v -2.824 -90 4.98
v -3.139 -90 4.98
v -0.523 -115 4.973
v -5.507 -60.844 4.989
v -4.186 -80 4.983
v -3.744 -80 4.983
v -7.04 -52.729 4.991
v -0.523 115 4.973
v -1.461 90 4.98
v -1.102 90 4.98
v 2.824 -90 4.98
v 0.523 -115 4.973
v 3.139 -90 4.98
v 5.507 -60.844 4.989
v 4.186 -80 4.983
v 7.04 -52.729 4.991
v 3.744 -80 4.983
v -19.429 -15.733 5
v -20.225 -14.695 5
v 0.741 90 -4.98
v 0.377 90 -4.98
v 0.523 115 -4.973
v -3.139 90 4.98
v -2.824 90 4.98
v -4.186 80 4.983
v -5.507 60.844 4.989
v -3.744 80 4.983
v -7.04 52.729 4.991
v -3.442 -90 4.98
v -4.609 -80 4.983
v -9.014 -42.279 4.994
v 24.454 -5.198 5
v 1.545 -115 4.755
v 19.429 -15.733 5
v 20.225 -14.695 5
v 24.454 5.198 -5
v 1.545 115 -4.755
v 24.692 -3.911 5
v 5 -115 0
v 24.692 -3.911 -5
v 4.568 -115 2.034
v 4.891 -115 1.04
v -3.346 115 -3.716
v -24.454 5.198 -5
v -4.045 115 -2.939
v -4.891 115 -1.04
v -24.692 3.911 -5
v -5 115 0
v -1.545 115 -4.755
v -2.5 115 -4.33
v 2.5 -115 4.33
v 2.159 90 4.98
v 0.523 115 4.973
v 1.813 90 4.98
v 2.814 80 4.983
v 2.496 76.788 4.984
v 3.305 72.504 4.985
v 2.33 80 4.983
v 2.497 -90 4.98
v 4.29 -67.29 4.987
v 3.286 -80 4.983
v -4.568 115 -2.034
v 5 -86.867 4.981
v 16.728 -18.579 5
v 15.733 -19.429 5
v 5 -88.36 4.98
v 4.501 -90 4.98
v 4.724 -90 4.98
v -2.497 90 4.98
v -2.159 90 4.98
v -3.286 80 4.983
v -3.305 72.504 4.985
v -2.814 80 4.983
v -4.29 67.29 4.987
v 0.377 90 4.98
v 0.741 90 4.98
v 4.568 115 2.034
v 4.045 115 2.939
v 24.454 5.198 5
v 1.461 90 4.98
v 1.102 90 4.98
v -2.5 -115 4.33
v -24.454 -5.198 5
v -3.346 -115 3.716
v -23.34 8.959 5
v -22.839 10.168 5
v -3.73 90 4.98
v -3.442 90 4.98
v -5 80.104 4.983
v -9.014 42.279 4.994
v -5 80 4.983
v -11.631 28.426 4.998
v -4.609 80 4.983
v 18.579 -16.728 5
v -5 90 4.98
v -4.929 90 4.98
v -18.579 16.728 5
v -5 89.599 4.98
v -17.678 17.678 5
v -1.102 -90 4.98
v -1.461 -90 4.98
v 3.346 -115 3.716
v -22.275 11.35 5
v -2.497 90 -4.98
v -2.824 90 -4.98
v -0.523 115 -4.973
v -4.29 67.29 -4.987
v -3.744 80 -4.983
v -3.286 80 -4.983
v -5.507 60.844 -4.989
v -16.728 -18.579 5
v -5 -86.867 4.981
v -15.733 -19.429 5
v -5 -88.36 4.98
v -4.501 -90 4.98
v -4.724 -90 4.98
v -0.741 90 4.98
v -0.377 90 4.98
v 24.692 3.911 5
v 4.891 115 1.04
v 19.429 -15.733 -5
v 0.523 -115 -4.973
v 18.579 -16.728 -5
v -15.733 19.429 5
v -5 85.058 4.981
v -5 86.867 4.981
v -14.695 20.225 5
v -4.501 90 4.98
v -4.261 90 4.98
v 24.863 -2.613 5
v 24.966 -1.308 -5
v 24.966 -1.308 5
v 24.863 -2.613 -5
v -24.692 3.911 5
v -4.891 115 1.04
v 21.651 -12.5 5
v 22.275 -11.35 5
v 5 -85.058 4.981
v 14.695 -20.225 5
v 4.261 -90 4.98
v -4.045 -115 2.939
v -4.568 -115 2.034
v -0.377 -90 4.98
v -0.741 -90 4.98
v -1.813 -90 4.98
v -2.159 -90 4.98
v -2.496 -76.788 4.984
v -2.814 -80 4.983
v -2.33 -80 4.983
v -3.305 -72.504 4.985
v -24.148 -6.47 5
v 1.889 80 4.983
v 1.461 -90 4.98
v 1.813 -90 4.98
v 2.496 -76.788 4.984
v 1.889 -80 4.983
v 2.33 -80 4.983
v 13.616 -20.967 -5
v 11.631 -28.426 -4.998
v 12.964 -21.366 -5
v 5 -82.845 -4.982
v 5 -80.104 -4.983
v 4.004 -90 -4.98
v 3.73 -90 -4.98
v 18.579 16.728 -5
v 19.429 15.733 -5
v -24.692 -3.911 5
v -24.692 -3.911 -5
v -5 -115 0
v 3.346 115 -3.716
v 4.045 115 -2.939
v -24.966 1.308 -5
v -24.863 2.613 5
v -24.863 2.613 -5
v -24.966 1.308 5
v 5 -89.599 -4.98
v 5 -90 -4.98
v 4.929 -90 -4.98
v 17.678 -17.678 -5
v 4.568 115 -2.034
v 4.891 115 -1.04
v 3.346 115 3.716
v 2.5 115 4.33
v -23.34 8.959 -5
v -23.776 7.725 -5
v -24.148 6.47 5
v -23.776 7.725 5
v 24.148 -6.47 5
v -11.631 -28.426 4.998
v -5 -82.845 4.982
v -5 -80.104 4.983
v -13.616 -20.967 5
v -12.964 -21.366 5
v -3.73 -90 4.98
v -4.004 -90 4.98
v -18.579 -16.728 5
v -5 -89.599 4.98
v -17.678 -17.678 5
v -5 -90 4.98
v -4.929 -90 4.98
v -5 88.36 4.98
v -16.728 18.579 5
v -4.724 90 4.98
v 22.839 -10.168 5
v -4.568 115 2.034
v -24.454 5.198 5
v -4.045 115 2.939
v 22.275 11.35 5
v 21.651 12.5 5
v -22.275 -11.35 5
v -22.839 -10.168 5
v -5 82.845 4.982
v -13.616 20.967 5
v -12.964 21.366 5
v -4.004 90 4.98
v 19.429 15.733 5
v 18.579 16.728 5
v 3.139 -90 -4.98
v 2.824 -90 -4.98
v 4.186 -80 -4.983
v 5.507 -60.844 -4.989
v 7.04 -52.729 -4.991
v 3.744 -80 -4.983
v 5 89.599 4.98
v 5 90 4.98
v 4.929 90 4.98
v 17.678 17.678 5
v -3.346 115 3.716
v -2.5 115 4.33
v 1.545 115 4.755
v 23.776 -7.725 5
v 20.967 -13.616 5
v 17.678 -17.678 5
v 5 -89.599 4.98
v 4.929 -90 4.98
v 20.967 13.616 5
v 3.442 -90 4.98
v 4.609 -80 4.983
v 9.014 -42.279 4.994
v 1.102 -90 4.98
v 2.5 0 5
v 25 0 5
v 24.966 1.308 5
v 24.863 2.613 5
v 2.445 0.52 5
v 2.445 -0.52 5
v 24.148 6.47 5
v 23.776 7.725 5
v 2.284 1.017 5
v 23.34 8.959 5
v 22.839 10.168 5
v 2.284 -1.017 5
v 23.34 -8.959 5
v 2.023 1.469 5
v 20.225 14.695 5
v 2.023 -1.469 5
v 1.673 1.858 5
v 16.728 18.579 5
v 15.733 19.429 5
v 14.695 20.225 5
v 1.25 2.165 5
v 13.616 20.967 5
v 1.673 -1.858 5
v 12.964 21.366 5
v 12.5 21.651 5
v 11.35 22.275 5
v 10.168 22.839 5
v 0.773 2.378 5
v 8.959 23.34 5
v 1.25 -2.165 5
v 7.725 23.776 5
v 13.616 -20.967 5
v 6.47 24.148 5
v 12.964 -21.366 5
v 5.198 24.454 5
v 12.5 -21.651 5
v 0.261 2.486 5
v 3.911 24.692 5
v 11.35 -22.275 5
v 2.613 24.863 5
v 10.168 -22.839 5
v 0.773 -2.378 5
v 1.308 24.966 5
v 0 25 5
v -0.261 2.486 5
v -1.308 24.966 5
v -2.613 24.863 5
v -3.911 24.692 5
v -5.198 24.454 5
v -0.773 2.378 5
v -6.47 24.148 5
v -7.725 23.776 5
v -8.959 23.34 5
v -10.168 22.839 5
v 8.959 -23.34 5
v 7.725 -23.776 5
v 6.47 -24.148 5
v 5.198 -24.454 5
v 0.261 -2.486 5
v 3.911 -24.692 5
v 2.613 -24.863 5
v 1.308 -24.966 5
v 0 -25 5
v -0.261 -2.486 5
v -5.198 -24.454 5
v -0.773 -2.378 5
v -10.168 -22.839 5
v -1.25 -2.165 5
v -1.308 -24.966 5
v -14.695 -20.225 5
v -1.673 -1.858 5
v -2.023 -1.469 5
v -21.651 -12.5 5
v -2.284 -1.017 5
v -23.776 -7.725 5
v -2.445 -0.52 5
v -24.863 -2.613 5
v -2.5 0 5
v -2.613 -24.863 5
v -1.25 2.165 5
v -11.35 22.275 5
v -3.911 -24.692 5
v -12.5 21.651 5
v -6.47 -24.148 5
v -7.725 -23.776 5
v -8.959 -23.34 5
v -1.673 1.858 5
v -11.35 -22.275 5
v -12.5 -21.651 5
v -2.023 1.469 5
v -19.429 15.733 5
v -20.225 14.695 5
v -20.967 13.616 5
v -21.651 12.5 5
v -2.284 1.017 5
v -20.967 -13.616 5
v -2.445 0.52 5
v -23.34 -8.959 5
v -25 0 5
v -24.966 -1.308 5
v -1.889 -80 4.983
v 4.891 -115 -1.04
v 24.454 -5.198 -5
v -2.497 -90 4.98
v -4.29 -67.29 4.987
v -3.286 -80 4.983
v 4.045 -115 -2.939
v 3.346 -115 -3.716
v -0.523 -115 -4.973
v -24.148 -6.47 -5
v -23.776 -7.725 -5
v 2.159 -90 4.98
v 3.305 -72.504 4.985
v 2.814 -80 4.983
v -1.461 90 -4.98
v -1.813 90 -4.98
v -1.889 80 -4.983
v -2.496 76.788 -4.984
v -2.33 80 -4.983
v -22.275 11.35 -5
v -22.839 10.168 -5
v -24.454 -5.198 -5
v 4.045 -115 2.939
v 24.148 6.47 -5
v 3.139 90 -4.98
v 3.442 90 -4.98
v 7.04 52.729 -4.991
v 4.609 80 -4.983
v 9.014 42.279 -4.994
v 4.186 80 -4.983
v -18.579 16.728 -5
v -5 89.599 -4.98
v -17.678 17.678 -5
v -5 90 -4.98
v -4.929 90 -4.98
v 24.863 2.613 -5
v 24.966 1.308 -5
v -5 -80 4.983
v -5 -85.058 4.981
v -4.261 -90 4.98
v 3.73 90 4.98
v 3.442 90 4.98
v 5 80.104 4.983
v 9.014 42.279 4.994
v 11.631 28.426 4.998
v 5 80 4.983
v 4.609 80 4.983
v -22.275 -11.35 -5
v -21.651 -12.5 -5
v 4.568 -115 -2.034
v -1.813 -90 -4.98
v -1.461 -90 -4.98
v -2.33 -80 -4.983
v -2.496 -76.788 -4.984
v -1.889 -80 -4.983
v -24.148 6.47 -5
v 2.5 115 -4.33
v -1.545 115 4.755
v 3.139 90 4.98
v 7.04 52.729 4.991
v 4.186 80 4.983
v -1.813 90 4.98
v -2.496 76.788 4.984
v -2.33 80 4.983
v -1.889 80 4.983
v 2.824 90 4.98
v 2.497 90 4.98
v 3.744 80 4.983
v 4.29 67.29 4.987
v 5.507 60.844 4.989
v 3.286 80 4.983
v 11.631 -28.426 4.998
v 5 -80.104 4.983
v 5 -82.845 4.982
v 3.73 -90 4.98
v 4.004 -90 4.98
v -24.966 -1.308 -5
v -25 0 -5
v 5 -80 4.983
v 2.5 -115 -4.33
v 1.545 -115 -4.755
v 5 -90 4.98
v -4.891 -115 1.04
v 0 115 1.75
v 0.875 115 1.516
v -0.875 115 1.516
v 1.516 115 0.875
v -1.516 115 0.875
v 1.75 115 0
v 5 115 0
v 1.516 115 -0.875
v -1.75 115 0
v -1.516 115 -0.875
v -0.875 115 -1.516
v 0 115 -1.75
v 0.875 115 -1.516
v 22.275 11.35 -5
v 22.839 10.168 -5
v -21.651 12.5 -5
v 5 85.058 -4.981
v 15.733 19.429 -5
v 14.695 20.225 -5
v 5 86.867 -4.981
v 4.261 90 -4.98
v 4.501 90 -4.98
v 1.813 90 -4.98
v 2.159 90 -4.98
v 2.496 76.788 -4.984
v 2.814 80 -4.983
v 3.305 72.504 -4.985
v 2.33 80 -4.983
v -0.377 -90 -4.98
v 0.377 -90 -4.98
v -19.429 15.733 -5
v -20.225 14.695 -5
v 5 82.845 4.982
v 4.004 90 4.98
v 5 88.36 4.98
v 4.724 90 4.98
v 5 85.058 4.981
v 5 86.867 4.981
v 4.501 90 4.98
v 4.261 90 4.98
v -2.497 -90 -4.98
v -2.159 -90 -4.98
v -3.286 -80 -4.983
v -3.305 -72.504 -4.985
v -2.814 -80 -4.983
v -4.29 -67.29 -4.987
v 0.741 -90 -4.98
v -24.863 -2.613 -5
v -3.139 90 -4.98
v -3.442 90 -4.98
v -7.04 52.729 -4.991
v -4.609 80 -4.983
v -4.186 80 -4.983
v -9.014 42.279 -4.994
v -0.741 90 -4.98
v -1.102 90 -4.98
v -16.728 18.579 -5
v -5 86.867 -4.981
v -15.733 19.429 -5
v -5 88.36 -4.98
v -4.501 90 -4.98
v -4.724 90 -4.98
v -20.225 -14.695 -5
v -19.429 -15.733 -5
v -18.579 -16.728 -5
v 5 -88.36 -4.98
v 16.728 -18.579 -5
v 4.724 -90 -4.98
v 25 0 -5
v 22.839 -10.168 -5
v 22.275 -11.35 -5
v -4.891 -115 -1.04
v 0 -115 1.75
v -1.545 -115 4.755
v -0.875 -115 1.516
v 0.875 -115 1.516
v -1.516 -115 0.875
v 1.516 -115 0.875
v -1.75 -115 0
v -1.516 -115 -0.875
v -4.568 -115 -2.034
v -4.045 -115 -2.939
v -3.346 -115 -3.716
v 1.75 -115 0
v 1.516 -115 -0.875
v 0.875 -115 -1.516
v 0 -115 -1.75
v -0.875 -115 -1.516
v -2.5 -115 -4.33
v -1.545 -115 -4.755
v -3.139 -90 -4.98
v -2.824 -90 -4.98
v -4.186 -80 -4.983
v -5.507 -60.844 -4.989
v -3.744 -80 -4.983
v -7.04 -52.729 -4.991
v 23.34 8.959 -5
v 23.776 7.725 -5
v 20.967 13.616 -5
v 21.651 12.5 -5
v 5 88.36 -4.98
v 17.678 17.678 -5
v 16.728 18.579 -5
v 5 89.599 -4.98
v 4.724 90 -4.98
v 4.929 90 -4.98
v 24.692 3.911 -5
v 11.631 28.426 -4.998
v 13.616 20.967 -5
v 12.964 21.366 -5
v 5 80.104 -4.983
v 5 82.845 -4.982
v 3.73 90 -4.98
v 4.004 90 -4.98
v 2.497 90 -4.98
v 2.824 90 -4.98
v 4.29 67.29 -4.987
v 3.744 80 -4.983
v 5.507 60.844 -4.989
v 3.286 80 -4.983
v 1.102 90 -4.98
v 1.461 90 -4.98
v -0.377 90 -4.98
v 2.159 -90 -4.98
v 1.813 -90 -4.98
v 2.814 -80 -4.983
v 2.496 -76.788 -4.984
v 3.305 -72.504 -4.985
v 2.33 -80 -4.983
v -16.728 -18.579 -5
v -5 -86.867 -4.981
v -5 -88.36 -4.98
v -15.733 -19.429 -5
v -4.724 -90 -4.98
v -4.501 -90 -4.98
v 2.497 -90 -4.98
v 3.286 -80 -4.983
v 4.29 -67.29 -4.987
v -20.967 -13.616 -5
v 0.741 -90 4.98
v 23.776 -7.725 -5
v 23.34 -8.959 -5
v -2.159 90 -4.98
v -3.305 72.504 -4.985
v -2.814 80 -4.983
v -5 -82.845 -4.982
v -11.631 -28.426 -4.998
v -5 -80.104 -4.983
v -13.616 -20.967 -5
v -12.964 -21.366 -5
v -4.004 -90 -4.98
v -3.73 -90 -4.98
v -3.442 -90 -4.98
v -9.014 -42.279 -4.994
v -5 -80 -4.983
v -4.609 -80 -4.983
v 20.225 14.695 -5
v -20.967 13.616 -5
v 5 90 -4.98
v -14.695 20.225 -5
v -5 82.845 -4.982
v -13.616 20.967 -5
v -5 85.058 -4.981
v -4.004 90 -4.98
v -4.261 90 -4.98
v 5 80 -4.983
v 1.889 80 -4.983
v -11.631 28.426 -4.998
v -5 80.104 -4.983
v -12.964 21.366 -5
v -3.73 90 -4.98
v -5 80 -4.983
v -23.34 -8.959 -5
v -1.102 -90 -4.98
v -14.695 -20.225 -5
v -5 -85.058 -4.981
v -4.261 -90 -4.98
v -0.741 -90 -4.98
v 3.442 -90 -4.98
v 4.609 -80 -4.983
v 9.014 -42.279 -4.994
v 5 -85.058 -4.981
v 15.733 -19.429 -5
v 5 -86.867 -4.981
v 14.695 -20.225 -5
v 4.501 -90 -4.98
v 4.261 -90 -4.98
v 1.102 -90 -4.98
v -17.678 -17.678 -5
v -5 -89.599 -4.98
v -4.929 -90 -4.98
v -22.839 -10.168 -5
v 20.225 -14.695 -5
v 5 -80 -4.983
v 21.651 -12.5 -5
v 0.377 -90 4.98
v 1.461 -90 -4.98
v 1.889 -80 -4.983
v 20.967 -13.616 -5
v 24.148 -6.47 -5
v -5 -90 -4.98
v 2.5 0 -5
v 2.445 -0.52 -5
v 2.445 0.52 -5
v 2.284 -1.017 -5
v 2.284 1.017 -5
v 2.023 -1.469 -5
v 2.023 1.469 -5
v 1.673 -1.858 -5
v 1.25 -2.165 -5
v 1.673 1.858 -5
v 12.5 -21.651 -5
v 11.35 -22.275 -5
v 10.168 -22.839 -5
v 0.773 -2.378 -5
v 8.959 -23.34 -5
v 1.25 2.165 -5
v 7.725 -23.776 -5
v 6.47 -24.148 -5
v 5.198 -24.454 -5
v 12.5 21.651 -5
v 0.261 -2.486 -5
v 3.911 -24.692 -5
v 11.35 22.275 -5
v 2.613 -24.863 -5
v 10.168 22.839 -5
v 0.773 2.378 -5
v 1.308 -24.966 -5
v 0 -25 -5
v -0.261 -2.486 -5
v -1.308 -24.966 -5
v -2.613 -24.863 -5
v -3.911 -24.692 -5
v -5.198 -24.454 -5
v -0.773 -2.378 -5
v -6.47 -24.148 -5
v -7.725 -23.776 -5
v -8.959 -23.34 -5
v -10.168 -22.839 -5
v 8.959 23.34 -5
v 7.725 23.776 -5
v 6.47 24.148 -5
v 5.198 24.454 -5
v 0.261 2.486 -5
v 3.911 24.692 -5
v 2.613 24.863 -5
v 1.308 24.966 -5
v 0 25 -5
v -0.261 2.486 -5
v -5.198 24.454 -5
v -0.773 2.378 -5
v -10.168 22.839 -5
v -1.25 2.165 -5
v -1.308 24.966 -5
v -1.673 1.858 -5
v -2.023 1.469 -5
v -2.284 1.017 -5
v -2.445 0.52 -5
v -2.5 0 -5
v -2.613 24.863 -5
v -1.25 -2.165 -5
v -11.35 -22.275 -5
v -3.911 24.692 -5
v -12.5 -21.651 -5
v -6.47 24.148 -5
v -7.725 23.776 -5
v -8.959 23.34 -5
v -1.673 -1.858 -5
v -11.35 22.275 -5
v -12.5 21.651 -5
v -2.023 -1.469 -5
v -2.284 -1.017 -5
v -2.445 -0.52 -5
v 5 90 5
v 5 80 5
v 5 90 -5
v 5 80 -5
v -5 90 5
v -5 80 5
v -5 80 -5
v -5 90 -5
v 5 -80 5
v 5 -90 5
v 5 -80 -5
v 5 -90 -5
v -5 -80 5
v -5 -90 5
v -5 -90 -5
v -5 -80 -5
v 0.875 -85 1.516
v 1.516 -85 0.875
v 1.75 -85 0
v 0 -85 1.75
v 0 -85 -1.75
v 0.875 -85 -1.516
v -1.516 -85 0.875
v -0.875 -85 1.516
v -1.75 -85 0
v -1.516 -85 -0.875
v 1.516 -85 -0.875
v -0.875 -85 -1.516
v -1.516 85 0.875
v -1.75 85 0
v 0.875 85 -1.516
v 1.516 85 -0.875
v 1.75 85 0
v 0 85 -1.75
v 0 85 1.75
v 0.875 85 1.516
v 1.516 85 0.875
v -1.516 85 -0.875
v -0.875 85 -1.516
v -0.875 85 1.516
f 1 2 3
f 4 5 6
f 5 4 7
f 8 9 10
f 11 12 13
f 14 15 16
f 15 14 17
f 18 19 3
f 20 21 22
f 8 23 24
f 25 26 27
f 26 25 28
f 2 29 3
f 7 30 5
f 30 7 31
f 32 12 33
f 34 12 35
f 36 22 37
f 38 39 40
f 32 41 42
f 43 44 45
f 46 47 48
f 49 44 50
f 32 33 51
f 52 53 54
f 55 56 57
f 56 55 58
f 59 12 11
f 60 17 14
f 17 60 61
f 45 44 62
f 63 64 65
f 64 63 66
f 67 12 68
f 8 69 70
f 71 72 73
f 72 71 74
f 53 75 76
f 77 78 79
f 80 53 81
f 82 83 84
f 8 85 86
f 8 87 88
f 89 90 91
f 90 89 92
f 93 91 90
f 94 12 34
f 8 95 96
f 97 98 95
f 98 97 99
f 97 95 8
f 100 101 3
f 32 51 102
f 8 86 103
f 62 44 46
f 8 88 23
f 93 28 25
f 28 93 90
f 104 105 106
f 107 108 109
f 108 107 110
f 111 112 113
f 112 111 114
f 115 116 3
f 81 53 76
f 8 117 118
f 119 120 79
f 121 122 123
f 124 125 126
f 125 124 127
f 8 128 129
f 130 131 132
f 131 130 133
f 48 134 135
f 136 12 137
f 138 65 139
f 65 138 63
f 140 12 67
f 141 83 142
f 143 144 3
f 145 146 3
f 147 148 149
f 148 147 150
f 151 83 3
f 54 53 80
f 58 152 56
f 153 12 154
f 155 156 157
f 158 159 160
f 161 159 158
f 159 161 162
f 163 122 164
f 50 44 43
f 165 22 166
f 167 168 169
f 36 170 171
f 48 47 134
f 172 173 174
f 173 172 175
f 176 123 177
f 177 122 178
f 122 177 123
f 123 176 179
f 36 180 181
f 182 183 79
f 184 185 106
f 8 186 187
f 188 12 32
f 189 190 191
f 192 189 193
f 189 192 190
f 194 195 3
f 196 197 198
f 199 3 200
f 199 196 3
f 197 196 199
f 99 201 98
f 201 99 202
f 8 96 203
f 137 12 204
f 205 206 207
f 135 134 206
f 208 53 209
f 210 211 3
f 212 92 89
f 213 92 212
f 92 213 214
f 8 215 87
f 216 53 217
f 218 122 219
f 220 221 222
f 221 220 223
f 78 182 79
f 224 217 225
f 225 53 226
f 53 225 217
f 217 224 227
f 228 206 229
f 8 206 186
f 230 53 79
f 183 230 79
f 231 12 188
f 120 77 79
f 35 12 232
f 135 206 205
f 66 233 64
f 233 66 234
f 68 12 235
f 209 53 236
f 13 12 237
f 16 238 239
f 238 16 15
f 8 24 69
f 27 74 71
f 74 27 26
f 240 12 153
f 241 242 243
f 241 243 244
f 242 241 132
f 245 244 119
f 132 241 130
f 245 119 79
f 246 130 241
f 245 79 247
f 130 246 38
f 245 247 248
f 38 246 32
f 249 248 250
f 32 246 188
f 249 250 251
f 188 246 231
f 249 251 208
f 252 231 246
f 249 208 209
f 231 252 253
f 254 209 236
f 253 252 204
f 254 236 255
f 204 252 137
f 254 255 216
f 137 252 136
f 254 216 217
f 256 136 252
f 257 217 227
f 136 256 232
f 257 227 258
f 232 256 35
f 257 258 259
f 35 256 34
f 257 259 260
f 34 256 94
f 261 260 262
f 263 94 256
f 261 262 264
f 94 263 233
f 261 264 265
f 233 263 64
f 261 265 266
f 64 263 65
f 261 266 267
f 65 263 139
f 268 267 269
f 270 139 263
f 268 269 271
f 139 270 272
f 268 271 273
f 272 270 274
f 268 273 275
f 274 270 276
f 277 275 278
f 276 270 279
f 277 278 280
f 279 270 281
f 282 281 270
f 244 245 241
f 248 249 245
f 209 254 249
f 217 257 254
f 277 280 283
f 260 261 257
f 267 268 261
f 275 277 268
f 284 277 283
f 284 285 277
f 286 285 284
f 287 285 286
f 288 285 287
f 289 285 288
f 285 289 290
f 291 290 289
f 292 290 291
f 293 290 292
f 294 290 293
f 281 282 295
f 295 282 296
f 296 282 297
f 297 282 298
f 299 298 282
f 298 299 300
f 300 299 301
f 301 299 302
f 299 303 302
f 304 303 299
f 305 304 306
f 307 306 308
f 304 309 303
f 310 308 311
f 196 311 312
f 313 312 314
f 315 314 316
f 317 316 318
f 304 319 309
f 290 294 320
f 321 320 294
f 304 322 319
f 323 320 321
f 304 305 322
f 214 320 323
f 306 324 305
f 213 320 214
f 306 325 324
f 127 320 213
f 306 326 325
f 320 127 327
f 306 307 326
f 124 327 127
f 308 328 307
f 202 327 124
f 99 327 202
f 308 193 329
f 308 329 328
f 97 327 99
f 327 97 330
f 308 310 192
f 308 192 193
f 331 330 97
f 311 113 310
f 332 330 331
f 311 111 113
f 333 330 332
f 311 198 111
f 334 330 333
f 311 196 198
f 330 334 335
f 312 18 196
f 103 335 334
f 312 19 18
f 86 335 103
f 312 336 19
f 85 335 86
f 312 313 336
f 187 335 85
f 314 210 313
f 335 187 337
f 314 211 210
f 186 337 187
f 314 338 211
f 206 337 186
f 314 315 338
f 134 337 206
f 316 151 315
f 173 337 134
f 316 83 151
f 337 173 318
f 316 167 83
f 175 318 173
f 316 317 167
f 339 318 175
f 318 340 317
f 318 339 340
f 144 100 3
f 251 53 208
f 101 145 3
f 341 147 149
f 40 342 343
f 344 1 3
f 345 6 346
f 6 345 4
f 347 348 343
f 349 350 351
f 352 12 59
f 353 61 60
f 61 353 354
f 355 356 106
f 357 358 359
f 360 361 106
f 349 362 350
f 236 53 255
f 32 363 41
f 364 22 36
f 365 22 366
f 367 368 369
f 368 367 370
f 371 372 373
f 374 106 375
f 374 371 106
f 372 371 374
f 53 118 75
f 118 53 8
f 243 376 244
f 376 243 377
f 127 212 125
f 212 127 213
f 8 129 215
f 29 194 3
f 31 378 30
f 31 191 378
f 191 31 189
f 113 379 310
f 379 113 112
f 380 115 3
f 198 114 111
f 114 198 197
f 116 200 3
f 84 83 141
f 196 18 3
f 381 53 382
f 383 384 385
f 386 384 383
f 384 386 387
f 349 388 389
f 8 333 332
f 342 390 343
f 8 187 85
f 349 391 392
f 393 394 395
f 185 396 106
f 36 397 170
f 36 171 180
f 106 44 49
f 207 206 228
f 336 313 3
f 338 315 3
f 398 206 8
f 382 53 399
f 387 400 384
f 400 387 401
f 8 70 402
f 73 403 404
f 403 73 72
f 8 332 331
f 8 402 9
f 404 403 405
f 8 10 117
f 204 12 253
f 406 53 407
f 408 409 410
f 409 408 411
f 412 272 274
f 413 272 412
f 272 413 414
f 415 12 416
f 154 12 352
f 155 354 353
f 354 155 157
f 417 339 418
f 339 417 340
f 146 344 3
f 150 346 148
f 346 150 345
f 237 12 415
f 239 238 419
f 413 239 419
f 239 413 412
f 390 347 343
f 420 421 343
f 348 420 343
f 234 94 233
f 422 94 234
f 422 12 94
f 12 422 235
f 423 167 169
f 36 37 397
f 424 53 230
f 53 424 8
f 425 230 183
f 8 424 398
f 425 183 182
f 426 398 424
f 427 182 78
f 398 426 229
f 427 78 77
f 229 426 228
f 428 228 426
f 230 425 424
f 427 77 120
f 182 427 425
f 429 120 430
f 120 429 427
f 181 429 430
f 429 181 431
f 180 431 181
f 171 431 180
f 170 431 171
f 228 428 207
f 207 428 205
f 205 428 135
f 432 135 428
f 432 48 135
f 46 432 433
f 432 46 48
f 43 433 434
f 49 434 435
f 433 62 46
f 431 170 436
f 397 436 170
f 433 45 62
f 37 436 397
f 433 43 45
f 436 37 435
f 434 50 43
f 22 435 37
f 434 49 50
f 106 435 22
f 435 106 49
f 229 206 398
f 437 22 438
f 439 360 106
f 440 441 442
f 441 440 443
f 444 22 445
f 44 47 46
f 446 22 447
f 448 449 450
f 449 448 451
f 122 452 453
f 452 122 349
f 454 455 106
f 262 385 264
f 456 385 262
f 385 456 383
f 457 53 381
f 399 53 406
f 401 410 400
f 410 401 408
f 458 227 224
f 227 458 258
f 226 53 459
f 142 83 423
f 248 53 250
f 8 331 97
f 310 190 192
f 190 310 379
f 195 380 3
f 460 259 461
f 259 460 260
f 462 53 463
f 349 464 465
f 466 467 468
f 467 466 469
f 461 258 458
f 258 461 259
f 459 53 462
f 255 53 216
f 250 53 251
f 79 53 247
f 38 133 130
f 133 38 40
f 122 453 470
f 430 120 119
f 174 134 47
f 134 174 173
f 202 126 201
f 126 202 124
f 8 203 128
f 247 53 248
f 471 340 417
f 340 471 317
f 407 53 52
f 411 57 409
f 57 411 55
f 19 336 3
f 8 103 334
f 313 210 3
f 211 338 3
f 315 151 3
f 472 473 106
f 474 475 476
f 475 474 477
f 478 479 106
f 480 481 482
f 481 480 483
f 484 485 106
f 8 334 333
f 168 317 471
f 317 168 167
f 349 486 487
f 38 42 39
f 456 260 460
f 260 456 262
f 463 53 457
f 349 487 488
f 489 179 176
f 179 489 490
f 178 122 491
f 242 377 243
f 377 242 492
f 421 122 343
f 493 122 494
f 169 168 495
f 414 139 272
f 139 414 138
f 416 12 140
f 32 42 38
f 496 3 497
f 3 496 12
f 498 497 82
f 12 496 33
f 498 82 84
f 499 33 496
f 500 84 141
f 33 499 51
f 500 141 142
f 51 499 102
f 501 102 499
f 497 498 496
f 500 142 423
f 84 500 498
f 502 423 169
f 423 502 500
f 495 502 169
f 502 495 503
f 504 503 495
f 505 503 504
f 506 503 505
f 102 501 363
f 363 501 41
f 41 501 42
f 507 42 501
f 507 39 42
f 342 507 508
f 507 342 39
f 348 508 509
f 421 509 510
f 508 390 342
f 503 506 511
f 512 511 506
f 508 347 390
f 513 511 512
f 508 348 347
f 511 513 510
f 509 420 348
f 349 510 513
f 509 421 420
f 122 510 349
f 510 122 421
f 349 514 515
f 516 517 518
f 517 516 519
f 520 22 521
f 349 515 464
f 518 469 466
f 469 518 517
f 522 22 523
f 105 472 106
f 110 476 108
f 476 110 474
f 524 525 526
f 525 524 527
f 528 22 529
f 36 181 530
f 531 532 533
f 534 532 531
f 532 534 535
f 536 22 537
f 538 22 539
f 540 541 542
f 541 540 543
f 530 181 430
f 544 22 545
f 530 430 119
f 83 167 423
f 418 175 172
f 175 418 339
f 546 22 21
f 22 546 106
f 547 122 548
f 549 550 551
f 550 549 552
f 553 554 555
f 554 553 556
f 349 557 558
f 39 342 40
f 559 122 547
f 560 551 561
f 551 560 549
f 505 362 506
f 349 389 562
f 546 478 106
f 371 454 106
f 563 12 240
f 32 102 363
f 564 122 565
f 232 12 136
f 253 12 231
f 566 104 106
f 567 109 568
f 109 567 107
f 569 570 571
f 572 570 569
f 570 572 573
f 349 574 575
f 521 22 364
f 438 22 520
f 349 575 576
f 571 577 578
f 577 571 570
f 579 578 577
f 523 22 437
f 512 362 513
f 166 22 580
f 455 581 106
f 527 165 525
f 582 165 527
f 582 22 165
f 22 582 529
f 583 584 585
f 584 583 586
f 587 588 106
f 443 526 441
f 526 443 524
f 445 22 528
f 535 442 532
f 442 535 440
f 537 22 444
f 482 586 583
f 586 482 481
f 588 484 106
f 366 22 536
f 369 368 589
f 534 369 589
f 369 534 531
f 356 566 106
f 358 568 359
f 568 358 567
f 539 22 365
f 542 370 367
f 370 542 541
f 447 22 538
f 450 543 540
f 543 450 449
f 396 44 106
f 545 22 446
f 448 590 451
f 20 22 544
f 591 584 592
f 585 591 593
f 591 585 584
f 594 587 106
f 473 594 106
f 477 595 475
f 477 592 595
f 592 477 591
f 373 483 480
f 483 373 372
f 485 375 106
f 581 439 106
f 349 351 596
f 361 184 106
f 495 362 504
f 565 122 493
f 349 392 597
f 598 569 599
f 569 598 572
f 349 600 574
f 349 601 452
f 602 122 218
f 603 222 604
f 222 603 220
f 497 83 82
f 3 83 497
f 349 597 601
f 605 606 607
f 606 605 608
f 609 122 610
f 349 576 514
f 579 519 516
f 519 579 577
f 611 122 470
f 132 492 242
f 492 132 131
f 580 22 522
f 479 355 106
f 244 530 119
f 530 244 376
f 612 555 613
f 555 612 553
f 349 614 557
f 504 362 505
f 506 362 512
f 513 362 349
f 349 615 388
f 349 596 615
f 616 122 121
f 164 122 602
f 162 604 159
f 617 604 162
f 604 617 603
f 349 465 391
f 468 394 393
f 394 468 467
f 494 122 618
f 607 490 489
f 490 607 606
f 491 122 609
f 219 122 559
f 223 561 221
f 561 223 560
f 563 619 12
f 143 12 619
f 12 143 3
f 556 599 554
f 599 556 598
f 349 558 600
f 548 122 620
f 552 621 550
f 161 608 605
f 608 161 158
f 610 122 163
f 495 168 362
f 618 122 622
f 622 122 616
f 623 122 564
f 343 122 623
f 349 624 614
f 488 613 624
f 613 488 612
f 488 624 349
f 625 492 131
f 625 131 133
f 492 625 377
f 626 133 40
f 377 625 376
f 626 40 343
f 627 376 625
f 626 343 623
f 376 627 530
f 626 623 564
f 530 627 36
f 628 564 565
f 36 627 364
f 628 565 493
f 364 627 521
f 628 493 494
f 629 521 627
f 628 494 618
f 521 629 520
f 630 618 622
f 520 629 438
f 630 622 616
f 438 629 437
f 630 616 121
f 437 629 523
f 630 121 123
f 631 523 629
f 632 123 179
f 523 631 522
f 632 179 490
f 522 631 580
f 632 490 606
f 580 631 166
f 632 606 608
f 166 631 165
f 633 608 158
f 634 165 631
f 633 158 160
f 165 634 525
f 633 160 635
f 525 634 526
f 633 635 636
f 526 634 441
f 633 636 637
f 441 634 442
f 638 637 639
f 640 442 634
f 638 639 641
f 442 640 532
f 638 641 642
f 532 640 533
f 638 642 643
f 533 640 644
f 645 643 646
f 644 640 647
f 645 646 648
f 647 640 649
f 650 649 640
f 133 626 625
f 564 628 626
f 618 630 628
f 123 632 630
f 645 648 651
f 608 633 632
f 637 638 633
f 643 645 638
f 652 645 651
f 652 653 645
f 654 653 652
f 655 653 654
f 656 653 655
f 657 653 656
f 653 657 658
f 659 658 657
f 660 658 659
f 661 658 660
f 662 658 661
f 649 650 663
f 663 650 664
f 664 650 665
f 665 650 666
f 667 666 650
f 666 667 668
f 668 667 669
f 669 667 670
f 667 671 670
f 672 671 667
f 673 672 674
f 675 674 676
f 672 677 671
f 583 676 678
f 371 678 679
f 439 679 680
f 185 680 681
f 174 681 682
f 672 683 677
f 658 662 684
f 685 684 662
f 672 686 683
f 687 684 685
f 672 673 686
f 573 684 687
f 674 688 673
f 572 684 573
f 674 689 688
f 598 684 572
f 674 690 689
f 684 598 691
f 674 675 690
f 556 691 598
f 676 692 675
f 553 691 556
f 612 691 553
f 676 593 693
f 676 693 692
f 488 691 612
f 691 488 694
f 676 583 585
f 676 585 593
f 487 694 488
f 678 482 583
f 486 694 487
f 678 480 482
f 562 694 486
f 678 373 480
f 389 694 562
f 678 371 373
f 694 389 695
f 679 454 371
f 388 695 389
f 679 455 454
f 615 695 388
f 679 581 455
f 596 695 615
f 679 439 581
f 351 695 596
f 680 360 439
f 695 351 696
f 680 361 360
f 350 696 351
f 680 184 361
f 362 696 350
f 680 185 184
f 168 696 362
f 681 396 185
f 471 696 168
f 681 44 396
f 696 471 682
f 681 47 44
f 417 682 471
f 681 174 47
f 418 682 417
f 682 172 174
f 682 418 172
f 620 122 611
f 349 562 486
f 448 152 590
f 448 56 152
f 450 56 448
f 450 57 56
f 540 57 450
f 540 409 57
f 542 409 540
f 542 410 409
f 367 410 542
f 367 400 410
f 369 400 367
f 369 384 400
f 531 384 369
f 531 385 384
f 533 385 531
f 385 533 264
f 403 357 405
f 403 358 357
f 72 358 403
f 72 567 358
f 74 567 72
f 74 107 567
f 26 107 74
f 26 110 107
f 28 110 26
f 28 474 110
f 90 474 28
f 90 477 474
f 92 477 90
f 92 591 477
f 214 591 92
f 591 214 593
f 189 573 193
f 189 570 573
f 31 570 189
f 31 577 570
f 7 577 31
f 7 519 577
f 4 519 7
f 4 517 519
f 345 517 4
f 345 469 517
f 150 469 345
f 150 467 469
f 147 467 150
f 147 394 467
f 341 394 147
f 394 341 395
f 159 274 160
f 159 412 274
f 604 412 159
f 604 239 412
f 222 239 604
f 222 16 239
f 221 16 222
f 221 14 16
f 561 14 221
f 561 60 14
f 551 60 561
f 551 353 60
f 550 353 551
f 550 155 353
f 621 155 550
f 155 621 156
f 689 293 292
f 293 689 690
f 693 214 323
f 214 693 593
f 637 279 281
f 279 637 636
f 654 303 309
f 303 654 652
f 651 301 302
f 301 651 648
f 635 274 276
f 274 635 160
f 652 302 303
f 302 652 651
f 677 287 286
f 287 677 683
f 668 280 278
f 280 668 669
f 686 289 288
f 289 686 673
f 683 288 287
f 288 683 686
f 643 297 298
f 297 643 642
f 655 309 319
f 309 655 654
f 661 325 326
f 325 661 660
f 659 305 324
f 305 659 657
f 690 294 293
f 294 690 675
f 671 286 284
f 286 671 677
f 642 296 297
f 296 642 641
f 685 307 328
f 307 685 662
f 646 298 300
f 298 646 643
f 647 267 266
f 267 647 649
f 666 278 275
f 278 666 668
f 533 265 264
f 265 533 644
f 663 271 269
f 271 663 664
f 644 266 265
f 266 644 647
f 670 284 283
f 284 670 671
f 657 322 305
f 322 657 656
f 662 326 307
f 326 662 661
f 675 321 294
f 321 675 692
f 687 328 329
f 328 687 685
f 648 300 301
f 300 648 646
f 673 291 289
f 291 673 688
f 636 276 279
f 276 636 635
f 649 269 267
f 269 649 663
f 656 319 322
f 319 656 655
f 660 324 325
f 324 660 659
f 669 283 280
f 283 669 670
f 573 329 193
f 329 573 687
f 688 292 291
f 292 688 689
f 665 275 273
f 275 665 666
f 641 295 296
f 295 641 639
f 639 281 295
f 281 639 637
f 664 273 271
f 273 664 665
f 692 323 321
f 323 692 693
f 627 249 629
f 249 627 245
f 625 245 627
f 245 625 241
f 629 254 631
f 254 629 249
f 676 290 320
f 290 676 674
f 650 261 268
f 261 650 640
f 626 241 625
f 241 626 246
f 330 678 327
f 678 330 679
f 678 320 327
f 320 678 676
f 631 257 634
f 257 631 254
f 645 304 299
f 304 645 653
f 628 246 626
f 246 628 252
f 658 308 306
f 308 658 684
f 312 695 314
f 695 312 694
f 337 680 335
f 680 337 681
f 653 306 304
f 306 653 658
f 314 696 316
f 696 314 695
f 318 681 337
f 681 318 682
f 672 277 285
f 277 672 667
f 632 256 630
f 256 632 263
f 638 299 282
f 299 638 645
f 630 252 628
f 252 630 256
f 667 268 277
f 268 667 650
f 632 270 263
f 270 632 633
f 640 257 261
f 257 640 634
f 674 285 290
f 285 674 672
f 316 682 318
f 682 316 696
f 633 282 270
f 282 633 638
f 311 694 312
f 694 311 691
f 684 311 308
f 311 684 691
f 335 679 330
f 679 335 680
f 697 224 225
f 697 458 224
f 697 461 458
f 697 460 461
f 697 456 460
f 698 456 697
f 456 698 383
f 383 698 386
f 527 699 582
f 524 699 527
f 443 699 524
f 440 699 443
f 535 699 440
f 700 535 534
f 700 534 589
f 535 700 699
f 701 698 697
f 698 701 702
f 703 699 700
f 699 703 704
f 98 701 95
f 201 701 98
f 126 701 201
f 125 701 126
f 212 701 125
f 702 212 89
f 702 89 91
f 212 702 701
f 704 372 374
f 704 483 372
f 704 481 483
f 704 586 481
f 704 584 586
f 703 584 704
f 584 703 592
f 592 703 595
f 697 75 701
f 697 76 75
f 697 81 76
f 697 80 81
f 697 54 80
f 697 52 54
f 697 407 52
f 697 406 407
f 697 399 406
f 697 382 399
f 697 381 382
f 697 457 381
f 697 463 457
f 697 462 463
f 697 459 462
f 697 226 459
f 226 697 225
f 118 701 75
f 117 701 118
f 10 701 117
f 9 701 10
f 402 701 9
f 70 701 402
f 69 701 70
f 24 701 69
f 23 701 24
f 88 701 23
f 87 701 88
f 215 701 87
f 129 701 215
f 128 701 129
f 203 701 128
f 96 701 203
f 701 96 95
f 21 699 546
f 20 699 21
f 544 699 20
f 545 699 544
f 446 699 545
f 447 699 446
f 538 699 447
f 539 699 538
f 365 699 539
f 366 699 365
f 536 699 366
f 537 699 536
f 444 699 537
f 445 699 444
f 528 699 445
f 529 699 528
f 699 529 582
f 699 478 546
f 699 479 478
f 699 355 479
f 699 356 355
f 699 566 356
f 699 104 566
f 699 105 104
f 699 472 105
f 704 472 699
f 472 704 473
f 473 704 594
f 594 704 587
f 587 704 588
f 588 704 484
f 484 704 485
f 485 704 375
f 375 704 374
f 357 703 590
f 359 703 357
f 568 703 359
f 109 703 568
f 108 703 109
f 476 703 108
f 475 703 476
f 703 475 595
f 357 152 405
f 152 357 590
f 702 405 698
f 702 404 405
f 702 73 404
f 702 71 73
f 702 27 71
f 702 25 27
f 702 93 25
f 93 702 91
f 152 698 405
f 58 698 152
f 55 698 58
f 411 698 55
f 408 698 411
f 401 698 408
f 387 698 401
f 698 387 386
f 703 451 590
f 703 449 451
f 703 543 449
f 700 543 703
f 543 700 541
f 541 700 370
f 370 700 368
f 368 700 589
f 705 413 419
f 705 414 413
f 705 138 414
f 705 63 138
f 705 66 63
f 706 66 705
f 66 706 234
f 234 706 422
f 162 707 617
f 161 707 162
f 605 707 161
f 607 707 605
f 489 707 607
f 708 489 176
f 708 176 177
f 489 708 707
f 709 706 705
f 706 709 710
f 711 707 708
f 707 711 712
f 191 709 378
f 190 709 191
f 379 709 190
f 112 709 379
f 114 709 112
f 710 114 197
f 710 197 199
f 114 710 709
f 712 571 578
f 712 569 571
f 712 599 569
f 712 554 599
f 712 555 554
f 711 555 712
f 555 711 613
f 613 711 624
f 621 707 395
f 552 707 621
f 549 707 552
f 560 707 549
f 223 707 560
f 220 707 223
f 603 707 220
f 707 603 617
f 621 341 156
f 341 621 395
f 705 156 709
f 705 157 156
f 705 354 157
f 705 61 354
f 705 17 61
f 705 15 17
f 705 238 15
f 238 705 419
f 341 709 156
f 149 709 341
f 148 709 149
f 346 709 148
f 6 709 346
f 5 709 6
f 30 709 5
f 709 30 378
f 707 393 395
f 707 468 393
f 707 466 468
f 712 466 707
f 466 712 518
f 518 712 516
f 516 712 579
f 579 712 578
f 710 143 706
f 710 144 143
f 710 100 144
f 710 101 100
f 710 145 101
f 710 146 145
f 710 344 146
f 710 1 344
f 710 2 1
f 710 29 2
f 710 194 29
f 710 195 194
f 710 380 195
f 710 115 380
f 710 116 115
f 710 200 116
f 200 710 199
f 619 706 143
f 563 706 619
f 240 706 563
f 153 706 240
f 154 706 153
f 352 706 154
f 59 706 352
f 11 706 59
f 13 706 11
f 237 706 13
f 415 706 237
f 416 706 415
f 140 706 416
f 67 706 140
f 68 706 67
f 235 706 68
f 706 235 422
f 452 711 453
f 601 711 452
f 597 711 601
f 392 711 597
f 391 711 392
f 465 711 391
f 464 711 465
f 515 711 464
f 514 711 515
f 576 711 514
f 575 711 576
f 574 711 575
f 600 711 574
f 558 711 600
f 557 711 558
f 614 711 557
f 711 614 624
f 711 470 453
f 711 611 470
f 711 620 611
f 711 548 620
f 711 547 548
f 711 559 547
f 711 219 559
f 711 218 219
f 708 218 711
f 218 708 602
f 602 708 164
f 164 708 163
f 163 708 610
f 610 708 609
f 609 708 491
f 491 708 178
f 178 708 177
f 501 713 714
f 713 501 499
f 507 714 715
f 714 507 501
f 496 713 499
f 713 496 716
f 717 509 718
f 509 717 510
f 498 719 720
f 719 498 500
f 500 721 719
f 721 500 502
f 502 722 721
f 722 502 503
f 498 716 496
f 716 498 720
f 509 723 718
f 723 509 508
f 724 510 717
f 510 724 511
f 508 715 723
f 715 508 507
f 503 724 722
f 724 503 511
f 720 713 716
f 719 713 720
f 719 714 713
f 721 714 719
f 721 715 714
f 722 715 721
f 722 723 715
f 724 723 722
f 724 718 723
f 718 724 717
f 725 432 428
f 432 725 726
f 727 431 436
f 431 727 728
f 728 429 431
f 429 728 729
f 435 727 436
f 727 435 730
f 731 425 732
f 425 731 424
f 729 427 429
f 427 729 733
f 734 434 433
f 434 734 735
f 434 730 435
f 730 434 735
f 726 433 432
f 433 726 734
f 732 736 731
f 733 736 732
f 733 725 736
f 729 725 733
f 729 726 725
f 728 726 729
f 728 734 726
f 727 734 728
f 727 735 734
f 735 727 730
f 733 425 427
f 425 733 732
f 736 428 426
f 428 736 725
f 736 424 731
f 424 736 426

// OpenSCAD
difference(){
union(){
difference(){
hull(){
cylinder(d=50,h=10,center=true,$fn=120);
rotate([90,0,0])
cylinder(d=10,h=230,center=true,$fn=30);
}
translate([0,0,-5])linear_extrude(10)
polygon([[17,0],[0,90],[-17,0]]);
rotate([0,0,180])
translate([0,0,-5])linear_extrude(10)
polygon([[17,0],[0,90],[-17,0]]);
}
difference(){
cylinder(d=50,h=10,center=true,$fn=120);
cylinder(d=5,h=10,center=true,$fn=30);
}
translate([0,85,0])
cube([10,10,10],center=true);
translate([0,-85,0])
cube([10,10,10],center=true);
}
translate([0,-85,0])rotate([90,0,0])
cylinder(d=3.5,h=40,$fn=12);
translate([0,85,0])rotate([-90,0,0])
cylinder(d=3.5,h=40,$fn=12);
}
